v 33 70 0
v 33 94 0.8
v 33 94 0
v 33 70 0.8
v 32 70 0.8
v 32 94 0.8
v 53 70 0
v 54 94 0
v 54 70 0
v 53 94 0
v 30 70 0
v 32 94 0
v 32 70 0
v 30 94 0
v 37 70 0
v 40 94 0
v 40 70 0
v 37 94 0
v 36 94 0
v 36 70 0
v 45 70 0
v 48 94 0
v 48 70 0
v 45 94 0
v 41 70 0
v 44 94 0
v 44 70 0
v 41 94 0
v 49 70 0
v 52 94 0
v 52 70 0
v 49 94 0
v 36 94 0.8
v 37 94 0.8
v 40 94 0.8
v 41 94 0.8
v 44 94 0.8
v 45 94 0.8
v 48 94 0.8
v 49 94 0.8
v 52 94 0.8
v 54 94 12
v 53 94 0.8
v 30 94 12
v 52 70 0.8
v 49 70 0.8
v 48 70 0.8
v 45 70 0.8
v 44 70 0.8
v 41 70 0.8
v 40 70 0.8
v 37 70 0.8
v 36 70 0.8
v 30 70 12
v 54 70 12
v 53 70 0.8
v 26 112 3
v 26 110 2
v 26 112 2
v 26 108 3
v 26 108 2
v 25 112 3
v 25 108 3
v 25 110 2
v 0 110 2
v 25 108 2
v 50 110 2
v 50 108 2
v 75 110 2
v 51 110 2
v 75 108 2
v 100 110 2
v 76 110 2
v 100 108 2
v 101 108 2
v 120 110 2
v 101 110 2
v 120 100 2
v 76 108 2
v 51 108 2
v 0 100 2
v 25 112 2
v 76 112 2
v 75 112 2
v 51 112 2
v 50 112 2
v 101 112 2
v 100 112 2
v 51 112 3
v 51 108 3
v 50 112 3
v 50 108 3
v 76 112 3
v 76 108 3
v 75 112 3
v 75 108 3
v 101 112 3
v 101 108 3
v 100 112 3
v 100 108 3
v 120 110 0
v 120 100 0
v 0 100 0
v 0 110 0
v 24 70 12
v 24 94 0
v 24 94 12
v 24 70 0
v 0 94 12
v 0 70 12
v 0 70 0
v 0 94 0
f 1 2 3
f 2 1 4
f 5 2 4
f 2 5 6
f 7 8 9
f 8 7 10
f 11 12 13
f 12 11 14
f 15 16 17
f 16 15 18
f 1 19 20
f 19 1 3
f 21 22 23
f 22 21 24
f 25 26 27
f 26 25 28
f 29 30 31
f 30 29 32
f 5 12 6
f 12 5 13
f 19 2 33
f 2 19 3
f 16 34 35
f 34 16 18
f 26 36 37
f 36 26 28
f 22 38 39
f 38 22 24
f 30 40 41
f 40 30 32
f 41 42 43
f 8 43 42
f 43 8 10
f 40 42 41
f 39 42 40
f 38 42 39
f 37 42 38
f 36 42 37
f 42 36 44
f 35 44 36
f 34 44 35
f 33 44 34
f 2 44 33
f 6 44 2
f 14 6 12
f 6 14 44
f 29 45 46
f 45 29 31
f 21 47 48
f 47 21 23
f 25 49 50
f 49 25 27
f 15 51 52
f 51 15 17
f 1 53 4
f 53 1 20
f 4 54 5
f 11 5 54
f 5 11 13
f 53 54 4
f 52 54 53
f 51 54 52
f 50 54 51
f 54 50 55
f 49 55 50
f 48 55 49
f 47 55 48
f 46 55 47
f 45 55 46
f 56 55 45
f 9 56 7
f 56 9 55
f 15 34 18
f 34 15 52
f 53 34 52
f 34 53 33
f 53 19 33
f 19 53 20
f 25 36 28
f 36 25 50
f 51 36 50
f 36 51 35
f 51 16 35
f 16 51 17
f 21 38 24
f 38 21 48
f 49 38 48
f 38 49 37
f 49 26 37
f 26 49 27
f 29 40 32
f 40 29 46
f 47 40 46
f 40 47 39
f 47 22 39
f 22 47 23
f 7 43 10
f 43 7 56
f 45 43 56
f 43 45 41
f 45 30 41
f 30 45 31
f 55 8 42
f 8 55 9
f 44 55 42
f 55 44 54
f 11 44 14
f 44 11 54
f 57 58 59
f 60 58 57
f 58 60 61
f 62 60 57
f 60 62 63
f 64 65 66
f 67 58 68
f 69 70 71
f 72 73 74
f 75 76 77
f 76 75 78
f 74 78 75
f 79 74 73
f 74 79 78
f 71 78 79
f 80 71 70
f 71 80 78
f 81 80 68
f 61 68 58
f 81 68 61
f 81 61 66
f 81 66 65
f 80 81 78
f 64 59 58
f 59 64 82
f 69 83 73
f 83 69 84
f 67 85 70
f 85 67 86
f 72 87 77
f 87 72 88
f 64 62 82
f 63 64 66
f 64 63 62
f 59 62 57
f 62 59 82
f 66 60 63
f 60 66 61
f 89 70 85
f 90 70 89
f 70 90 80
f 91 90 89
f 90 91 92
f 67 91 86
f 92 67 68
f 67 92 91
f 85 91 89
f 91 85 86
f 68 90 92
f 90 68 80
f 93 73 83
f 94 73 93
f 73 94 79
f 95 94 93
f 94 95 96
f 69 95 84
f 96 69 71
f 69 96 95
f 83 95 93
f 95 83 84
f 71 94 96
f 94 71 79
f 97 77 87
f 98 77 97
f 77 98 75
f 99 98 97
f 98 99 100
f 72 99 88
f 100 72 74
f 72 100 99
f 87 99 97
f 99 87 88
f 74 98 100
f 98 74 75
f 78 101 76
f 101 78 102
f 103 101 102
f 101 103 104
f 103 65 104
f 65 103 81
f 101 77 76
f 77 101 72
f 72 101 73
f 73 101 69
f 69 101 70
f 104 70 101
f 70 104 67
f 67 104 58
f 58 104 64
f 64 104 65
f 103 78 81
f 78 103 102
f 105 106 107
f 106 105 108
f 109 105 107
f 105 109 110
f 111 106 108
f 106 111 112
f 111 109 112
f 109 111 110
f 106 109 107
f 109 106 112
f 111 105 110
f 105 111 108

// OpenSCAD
/*
Title: Friction Ramp Kit
Folder: 06_friction_contact
Physics Topic: Inclines, normal force, and friction
Difficulty: Beginner-Intermediate
Print Type: FDM, single material
Teaches: Conceptual mechanics
Use Case: Classroom manipulative
*/


// --------------------
// Parameters
// --------------------
ramp_length = 120;
ramp_width = 60;
ramp_height = 40;
angle_marks = [10,20,30,40];
block_size = [24,24,12];
texture_depth = 0.8;

module ramp(){
    polyhedron(
      points=[[0,0,0],[ramp_length,0,0],[ramp_length,ramp_width,0],[0,ramp_width,0],[0,0,ramp_height],[0,ramp_width,ramp_height]],
      faces=[[0,1,2,3],[0,1,4],[1,2,5,4],[2,3,5],[3,0,4,5],[0,3,2,1]]);
}

module block(textured=false){
    difference(){
        cube(block_size);
        if(textured)
            for(x=[2:4:block_size[0]-2]) translate([x,0,0]) cube([1,block_size[1],texture_depth]);
    }
}

module angle_strip(){
    cube([ramp_length,10,2]);
    for(a=angle_marks) translate([a*2.5,8,2]) cube([1,4,1]);
}

// --------------------
// Physics Meaning
// --------------------
// Angle changes normal force and friction threshold.

// --------------------
// Learning Notes
// --------------------
// Predict before testing which angle starts slipping.

// --------------------
// Print Notes
// --------------------
// Print ramp on base. Blocks print separately; no supports required.

// --------------------
// Customization Ideas
// --------------------
// Create multiple ramps with fixed heights for quick comparisons.

ramp();
translate([0,70,0]) block(false);
translate([30,70,0]) block(true);
translate([0,100,0]) angle_strip();
